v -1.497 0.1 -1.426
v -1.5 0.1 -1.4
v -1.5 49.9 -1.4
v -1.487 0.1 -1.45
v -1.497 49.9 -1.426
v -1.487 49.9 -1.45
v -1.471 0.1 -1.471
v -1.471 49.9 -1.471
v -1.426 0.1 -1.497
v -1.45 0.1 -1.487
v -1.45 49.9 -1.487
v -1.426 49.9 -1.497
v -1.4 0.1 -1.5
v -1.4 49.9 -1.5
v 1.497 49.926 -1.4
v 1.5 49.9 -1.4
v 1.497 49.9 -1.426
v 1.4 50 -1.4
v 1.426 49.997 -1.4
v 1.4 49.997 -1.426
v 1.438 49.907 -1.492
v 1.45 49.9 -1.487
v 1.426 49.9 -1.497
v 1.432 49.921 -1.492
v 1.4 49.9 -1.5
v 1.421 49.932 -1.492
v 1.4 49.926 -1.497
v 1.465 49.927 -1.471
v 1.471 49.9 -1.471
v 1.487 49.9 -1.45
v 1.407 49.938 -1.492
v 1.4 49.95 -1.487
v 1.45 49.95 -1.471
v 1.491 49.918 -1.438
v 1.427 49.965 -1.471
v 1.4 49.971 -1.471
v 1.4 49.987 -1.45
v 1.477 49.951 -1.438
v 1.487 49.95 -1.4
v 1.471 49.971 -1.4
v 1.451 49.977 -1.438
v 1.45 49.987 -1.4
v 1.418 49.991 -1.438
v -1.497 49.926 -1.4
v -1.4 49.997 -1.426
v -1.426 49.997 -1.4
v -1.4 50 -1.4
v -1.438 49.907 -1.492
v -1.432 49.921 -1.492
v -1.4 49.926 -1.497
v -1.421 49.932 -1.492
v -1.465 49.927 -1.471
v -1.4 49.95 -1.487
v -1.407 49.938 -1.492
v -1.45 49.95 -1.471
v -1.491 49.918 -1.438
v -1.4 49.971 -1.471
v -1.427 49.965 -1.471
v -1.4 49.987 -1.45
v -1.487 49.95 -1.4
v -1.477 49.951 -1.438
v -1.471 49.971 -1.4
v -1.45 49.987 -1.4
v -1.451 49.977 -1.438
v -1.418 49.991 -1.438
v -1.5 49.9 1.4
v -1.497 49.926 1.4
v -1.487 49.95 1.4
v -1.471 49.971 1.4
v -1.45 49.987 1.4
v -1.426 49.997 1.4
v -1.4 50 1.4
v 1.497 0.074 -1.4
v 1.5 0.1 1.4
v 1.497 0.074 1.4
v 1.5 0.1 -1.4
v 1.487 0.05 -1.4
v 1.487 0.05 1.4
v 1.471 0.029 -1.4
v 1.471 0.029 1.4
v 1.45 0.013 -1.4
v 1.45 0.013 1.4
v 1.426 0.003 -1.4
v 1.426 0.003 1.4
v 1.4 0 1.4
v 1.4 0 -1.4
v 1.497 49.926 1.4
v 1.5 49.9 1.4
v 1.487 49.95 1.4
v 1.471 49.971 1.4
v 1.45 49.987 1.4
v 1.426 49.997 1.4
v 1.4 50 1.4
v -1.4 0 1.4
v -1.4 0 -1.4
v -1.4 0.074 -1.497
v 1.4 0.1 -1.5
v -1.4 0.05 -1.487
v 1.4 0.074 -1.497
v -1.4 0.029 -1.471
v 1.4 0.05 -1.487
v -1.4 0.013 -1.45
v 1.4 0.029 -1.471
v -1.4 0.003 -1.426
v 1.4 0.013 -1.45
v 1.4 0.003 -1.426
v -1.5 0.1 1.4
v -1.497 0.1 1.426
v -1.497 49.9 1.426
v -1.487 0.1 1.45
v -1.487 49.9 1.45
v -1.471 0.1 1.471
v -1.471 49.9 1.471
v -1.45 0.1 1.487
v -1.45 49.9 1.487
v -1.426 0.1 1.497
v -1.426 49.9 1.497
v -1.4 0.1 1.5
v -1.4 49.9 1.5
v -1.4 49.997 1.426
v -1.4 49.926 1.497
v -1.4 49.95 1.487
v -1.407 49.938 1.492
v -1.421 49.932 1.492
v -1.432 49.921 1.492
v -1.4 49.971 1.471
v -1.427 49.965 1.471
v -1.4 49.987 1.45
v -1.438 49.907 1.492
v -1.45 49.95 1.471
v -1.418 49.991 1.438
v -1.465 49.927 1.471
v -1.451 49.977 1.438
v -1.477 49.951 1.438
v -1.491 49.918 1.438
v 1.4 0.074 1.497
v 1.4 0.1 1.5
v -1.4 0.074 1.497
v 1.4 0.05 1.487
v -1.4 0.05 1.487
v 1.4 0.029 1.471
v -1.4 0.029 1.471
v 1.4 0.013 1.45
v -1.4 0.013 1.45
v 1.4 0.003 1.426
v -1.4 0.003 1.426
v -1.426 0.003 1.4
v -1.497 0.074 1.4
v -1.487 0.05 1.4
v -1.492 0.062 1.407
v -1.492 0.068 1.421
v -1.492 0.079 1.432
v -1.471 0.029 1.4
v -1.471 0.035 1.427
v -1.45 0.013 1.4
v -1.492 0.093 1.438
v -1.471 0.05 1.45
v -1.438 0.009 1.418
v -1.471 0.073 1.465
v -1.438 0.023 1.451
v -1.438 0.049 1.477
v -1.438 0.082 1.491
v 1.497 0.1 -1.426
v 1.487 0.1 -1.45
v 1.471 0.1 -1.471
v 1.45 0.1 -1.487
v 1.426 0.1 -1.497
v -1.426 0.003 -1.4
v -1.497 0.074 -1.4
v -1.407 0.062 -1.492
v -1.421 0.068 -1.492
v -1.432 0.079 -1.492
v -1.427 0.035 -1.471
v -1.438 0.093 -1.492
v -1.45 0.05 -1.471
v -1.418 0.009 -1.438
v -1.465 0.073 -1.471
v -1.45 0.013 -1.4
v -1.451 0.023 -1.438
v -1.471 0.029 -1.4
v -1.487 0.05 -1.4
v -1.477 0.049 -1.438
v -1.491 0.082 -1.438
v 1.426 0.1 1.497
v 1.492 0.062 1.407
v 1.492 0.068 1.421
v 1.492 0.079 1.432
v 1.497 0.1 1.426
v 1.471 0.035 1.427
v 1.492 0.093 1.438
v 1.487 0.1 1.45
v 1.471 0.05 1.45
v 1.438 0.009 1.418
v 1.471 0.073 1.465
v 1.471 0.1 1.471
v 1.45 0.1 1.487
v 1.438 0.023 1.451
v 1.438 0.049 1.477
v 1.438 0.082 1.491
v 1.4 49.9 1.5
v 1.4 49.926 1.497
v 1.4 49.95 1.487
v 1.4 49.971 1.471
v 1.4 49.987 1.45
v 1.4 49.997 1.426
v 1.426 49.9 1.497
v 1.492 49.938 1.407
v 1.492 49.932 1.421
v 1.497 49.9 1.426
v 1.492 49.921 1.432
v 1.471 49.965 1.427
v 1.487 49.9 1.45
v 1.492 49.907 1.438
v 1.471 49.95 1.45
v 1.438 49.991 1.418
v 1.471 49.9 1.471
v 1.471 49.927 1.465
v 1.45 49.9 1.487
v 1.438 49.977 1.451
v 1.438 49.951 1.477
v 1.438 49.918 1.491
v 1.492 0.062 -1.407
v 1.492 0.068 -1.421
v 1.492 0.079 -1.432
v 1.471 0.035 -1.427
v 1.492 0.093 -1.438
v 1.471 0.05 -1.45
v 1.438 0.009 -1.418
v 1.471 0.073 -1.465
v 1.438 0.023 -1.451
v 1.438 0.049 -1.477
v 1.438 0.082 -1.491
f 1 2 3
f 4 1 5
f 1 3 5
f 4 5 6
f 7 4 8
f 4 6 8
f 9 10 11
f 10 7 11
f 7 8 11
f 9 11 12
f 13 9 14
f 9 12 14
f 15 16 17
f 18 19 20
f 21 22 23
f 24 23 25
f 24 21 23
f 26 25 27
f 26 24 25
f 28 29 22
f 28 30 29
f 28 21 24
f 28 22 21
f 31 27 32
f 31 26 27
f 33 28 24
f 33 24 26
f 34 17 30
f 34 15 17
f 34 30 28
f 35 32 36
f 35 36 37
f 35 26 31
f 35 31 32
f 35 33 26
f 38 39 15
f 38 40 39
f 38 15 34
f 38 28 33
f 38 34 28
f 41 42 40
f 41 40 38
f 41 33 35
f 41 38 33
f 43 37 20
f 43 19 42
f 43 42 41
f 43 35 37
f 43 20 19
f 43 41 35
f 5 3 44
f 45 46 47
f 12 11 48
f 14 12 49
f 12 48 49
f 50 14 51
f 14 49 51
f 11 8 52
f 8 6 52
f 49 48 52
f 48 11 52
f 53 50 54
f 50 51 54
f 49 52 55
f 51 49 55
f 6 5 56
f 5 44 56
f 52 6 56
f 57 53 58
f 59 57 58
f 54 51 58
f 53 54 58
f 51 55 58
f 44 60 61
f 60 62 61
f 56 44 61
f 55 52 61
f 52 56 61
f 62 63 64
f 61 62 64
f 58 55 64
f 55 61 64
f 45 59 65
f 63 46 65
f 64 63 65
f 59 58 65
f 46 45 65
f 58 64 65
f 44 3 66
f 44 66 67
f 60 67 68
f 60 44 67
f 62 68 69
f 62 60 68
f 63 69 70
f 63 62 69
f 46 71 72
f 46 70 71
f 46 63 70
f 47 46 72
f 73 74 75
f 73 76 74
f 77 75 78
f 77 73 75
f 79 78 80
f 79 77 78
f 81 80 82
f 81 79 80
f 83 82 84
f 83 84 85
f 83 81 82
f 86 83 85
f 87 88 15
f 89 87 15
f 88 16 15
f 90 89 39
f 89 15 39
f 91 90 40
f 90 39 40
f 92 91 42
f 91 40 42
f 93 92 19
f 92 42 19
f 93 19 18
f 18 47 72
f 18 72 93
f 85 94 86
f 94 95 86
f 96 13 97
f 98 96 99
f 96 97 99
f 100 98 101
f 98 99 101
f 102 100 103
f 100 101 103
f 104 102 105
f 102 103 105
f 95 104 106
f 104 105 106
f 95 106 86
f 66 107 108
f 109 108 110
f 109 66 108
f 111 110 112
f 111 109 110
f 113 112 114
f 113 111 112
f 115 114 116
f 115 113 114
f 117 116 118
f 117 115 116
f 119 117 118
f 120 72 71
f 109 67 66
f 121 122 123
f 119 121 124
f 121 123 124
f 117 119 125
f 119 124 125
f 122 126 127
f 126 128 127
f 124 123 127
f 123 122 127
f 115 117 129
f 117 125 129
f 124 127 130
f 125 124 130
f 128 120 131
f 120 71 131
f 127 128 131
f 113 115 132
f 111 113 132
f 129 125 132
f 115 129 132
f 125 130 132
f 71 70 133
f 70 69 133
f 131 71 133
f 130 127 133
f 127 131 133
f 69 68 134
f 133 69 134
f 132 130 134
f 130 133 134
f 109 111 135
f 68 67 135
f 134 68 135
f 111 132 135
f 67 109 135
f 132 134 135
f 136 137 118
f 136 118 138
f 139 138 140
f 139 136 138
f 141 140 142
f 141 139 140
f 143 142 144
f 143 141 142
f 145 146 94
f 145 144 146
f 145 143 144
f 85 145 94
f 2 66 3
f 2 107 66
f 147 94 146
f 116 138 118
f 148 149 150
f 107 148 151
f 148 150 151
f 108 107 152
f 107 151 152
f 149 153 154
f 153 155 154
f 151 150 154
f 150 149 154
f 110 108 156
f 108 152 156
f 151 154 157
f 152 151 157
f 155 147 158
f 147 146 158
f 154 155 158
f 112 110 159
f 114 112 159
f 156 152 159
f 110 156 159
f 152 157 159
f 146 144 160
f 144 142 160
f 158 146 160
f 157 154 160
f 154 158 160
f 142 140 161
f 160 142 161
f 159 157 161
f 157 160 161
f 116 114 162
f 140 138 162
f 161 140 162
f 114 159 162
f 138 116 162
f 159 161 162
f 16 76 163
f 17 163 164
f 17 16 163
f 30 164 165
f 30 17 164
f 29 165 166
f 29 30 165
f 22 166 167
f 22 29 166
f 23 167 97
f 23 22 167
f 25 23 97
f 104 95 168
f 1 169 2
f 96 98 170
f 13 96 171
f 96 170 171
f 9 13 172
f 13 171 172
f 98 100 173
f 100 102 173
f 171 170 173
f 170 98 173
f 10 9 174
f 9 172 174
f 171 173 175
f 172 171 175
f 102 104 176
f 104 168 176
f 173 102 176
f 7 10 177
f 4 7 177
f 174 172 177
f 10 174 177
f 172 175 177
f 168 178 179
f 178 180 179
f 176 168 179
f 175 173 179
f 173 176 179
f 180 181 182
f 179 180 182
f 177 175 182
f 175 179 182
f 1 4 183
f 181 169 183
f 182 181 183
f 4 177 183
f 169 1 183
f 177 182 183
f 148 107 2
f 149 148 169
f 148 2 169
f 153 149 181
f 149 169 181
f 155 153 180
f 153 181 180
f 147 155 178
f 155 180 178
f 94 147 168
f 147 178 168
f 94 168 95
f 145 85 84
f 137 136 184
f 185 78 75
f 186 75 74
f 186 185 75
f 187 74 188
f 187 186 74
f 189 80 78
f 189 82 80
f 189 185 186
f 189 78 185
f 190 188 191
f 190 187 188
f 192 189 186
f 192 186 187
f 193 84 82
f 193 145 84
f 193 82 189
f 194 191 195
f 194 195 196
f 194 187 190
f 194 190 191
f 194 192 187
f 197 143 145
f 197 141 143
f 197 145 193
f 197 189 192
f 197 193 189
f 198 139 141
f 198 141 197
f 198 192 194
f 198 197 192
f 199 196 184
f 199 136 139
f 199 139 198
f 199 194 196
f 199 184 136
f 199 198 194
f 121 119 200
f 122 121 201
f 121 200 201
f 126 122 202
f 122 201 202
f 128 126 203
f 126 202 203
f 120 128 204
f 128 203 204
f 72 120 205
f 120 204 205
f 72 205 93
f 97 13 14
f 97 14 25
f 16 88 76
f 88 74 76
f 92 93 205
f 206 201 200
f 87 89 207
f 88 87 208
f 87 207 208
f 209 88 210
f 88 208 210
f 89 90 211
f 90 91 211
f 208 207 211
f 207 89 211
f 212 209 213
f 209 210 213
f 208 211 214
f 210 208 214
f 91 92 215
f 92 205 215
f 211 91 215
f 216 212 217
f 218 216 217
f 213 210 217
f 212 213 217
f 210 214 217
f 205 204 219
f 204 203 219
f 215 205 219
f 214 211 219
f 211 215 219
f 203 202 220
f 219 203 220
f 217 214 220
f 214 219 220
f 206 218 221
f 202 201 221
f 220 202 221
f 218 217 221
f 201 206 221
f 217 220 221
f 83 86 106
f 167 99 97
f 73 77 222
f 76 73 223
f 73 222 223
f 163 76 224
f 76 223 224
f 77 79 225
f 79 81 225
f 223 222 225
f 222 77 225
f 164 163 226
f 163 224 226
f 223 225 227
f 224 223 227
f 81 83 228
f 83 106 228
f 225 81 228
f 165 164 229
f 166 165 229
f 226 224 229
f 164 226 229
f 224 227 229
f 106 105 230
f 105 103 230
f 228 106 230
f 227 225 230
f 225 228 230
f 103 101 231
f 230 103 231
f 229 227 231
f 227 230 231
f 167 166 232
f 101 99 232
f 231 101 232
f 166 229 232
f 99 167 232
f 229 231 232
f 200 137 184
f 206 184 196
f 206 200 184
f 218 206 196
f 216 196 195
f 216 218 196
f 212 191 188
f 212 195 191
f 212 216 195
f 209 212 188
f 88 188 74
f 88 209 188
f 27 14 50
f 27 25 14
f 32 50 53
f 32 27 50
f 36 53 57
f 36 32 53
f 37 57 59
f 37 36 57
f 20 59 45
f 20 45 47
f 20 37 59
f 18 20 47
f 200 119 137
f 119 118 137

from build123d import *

# Parameters (mm, degrees)
ESQUISSE1_W        = 3
ESQUISSE1_H        = 3
BOSS_EXTRU_1_DEPTH = 50
CONG_1_R           = 0.1


with BuildPart() as part:
    # Esquisse1 → Boss.-Extru.1 (new body)
    with BuildSketch(Plane(origin=(0, 0, 0), x_dir=(1, 0, 0), z_dir=(0, 1, 0))):
        Rectangle(ESQUISSE1_W, ESQUISSE1_H)
    extrude(amount=BOSS_EXTRU_1_DEPTH)

    # Congé1
    cong_1_edges = [part.edges().sort_by_distance(p)[0] for p in [
        (-1.5, 50, 0),
        (0, 50, 1.5),
        (1.5, 50, 0),
        (0, 0, 1.5),
        (-1.5, 0, 0),
        (0, 0, -1.5),
        (1.5, 0, 0),
        (1.5, 25, 1.5),
        (-1.5, 25, 1.5),
        (-1.5, 25, -1.5),
        (1.5, 25, -1.5),
        (0, 50, -1.5),
    ]]
    fillet(cong_1_edges, radius=CONG_1_R)


solid = part.part
